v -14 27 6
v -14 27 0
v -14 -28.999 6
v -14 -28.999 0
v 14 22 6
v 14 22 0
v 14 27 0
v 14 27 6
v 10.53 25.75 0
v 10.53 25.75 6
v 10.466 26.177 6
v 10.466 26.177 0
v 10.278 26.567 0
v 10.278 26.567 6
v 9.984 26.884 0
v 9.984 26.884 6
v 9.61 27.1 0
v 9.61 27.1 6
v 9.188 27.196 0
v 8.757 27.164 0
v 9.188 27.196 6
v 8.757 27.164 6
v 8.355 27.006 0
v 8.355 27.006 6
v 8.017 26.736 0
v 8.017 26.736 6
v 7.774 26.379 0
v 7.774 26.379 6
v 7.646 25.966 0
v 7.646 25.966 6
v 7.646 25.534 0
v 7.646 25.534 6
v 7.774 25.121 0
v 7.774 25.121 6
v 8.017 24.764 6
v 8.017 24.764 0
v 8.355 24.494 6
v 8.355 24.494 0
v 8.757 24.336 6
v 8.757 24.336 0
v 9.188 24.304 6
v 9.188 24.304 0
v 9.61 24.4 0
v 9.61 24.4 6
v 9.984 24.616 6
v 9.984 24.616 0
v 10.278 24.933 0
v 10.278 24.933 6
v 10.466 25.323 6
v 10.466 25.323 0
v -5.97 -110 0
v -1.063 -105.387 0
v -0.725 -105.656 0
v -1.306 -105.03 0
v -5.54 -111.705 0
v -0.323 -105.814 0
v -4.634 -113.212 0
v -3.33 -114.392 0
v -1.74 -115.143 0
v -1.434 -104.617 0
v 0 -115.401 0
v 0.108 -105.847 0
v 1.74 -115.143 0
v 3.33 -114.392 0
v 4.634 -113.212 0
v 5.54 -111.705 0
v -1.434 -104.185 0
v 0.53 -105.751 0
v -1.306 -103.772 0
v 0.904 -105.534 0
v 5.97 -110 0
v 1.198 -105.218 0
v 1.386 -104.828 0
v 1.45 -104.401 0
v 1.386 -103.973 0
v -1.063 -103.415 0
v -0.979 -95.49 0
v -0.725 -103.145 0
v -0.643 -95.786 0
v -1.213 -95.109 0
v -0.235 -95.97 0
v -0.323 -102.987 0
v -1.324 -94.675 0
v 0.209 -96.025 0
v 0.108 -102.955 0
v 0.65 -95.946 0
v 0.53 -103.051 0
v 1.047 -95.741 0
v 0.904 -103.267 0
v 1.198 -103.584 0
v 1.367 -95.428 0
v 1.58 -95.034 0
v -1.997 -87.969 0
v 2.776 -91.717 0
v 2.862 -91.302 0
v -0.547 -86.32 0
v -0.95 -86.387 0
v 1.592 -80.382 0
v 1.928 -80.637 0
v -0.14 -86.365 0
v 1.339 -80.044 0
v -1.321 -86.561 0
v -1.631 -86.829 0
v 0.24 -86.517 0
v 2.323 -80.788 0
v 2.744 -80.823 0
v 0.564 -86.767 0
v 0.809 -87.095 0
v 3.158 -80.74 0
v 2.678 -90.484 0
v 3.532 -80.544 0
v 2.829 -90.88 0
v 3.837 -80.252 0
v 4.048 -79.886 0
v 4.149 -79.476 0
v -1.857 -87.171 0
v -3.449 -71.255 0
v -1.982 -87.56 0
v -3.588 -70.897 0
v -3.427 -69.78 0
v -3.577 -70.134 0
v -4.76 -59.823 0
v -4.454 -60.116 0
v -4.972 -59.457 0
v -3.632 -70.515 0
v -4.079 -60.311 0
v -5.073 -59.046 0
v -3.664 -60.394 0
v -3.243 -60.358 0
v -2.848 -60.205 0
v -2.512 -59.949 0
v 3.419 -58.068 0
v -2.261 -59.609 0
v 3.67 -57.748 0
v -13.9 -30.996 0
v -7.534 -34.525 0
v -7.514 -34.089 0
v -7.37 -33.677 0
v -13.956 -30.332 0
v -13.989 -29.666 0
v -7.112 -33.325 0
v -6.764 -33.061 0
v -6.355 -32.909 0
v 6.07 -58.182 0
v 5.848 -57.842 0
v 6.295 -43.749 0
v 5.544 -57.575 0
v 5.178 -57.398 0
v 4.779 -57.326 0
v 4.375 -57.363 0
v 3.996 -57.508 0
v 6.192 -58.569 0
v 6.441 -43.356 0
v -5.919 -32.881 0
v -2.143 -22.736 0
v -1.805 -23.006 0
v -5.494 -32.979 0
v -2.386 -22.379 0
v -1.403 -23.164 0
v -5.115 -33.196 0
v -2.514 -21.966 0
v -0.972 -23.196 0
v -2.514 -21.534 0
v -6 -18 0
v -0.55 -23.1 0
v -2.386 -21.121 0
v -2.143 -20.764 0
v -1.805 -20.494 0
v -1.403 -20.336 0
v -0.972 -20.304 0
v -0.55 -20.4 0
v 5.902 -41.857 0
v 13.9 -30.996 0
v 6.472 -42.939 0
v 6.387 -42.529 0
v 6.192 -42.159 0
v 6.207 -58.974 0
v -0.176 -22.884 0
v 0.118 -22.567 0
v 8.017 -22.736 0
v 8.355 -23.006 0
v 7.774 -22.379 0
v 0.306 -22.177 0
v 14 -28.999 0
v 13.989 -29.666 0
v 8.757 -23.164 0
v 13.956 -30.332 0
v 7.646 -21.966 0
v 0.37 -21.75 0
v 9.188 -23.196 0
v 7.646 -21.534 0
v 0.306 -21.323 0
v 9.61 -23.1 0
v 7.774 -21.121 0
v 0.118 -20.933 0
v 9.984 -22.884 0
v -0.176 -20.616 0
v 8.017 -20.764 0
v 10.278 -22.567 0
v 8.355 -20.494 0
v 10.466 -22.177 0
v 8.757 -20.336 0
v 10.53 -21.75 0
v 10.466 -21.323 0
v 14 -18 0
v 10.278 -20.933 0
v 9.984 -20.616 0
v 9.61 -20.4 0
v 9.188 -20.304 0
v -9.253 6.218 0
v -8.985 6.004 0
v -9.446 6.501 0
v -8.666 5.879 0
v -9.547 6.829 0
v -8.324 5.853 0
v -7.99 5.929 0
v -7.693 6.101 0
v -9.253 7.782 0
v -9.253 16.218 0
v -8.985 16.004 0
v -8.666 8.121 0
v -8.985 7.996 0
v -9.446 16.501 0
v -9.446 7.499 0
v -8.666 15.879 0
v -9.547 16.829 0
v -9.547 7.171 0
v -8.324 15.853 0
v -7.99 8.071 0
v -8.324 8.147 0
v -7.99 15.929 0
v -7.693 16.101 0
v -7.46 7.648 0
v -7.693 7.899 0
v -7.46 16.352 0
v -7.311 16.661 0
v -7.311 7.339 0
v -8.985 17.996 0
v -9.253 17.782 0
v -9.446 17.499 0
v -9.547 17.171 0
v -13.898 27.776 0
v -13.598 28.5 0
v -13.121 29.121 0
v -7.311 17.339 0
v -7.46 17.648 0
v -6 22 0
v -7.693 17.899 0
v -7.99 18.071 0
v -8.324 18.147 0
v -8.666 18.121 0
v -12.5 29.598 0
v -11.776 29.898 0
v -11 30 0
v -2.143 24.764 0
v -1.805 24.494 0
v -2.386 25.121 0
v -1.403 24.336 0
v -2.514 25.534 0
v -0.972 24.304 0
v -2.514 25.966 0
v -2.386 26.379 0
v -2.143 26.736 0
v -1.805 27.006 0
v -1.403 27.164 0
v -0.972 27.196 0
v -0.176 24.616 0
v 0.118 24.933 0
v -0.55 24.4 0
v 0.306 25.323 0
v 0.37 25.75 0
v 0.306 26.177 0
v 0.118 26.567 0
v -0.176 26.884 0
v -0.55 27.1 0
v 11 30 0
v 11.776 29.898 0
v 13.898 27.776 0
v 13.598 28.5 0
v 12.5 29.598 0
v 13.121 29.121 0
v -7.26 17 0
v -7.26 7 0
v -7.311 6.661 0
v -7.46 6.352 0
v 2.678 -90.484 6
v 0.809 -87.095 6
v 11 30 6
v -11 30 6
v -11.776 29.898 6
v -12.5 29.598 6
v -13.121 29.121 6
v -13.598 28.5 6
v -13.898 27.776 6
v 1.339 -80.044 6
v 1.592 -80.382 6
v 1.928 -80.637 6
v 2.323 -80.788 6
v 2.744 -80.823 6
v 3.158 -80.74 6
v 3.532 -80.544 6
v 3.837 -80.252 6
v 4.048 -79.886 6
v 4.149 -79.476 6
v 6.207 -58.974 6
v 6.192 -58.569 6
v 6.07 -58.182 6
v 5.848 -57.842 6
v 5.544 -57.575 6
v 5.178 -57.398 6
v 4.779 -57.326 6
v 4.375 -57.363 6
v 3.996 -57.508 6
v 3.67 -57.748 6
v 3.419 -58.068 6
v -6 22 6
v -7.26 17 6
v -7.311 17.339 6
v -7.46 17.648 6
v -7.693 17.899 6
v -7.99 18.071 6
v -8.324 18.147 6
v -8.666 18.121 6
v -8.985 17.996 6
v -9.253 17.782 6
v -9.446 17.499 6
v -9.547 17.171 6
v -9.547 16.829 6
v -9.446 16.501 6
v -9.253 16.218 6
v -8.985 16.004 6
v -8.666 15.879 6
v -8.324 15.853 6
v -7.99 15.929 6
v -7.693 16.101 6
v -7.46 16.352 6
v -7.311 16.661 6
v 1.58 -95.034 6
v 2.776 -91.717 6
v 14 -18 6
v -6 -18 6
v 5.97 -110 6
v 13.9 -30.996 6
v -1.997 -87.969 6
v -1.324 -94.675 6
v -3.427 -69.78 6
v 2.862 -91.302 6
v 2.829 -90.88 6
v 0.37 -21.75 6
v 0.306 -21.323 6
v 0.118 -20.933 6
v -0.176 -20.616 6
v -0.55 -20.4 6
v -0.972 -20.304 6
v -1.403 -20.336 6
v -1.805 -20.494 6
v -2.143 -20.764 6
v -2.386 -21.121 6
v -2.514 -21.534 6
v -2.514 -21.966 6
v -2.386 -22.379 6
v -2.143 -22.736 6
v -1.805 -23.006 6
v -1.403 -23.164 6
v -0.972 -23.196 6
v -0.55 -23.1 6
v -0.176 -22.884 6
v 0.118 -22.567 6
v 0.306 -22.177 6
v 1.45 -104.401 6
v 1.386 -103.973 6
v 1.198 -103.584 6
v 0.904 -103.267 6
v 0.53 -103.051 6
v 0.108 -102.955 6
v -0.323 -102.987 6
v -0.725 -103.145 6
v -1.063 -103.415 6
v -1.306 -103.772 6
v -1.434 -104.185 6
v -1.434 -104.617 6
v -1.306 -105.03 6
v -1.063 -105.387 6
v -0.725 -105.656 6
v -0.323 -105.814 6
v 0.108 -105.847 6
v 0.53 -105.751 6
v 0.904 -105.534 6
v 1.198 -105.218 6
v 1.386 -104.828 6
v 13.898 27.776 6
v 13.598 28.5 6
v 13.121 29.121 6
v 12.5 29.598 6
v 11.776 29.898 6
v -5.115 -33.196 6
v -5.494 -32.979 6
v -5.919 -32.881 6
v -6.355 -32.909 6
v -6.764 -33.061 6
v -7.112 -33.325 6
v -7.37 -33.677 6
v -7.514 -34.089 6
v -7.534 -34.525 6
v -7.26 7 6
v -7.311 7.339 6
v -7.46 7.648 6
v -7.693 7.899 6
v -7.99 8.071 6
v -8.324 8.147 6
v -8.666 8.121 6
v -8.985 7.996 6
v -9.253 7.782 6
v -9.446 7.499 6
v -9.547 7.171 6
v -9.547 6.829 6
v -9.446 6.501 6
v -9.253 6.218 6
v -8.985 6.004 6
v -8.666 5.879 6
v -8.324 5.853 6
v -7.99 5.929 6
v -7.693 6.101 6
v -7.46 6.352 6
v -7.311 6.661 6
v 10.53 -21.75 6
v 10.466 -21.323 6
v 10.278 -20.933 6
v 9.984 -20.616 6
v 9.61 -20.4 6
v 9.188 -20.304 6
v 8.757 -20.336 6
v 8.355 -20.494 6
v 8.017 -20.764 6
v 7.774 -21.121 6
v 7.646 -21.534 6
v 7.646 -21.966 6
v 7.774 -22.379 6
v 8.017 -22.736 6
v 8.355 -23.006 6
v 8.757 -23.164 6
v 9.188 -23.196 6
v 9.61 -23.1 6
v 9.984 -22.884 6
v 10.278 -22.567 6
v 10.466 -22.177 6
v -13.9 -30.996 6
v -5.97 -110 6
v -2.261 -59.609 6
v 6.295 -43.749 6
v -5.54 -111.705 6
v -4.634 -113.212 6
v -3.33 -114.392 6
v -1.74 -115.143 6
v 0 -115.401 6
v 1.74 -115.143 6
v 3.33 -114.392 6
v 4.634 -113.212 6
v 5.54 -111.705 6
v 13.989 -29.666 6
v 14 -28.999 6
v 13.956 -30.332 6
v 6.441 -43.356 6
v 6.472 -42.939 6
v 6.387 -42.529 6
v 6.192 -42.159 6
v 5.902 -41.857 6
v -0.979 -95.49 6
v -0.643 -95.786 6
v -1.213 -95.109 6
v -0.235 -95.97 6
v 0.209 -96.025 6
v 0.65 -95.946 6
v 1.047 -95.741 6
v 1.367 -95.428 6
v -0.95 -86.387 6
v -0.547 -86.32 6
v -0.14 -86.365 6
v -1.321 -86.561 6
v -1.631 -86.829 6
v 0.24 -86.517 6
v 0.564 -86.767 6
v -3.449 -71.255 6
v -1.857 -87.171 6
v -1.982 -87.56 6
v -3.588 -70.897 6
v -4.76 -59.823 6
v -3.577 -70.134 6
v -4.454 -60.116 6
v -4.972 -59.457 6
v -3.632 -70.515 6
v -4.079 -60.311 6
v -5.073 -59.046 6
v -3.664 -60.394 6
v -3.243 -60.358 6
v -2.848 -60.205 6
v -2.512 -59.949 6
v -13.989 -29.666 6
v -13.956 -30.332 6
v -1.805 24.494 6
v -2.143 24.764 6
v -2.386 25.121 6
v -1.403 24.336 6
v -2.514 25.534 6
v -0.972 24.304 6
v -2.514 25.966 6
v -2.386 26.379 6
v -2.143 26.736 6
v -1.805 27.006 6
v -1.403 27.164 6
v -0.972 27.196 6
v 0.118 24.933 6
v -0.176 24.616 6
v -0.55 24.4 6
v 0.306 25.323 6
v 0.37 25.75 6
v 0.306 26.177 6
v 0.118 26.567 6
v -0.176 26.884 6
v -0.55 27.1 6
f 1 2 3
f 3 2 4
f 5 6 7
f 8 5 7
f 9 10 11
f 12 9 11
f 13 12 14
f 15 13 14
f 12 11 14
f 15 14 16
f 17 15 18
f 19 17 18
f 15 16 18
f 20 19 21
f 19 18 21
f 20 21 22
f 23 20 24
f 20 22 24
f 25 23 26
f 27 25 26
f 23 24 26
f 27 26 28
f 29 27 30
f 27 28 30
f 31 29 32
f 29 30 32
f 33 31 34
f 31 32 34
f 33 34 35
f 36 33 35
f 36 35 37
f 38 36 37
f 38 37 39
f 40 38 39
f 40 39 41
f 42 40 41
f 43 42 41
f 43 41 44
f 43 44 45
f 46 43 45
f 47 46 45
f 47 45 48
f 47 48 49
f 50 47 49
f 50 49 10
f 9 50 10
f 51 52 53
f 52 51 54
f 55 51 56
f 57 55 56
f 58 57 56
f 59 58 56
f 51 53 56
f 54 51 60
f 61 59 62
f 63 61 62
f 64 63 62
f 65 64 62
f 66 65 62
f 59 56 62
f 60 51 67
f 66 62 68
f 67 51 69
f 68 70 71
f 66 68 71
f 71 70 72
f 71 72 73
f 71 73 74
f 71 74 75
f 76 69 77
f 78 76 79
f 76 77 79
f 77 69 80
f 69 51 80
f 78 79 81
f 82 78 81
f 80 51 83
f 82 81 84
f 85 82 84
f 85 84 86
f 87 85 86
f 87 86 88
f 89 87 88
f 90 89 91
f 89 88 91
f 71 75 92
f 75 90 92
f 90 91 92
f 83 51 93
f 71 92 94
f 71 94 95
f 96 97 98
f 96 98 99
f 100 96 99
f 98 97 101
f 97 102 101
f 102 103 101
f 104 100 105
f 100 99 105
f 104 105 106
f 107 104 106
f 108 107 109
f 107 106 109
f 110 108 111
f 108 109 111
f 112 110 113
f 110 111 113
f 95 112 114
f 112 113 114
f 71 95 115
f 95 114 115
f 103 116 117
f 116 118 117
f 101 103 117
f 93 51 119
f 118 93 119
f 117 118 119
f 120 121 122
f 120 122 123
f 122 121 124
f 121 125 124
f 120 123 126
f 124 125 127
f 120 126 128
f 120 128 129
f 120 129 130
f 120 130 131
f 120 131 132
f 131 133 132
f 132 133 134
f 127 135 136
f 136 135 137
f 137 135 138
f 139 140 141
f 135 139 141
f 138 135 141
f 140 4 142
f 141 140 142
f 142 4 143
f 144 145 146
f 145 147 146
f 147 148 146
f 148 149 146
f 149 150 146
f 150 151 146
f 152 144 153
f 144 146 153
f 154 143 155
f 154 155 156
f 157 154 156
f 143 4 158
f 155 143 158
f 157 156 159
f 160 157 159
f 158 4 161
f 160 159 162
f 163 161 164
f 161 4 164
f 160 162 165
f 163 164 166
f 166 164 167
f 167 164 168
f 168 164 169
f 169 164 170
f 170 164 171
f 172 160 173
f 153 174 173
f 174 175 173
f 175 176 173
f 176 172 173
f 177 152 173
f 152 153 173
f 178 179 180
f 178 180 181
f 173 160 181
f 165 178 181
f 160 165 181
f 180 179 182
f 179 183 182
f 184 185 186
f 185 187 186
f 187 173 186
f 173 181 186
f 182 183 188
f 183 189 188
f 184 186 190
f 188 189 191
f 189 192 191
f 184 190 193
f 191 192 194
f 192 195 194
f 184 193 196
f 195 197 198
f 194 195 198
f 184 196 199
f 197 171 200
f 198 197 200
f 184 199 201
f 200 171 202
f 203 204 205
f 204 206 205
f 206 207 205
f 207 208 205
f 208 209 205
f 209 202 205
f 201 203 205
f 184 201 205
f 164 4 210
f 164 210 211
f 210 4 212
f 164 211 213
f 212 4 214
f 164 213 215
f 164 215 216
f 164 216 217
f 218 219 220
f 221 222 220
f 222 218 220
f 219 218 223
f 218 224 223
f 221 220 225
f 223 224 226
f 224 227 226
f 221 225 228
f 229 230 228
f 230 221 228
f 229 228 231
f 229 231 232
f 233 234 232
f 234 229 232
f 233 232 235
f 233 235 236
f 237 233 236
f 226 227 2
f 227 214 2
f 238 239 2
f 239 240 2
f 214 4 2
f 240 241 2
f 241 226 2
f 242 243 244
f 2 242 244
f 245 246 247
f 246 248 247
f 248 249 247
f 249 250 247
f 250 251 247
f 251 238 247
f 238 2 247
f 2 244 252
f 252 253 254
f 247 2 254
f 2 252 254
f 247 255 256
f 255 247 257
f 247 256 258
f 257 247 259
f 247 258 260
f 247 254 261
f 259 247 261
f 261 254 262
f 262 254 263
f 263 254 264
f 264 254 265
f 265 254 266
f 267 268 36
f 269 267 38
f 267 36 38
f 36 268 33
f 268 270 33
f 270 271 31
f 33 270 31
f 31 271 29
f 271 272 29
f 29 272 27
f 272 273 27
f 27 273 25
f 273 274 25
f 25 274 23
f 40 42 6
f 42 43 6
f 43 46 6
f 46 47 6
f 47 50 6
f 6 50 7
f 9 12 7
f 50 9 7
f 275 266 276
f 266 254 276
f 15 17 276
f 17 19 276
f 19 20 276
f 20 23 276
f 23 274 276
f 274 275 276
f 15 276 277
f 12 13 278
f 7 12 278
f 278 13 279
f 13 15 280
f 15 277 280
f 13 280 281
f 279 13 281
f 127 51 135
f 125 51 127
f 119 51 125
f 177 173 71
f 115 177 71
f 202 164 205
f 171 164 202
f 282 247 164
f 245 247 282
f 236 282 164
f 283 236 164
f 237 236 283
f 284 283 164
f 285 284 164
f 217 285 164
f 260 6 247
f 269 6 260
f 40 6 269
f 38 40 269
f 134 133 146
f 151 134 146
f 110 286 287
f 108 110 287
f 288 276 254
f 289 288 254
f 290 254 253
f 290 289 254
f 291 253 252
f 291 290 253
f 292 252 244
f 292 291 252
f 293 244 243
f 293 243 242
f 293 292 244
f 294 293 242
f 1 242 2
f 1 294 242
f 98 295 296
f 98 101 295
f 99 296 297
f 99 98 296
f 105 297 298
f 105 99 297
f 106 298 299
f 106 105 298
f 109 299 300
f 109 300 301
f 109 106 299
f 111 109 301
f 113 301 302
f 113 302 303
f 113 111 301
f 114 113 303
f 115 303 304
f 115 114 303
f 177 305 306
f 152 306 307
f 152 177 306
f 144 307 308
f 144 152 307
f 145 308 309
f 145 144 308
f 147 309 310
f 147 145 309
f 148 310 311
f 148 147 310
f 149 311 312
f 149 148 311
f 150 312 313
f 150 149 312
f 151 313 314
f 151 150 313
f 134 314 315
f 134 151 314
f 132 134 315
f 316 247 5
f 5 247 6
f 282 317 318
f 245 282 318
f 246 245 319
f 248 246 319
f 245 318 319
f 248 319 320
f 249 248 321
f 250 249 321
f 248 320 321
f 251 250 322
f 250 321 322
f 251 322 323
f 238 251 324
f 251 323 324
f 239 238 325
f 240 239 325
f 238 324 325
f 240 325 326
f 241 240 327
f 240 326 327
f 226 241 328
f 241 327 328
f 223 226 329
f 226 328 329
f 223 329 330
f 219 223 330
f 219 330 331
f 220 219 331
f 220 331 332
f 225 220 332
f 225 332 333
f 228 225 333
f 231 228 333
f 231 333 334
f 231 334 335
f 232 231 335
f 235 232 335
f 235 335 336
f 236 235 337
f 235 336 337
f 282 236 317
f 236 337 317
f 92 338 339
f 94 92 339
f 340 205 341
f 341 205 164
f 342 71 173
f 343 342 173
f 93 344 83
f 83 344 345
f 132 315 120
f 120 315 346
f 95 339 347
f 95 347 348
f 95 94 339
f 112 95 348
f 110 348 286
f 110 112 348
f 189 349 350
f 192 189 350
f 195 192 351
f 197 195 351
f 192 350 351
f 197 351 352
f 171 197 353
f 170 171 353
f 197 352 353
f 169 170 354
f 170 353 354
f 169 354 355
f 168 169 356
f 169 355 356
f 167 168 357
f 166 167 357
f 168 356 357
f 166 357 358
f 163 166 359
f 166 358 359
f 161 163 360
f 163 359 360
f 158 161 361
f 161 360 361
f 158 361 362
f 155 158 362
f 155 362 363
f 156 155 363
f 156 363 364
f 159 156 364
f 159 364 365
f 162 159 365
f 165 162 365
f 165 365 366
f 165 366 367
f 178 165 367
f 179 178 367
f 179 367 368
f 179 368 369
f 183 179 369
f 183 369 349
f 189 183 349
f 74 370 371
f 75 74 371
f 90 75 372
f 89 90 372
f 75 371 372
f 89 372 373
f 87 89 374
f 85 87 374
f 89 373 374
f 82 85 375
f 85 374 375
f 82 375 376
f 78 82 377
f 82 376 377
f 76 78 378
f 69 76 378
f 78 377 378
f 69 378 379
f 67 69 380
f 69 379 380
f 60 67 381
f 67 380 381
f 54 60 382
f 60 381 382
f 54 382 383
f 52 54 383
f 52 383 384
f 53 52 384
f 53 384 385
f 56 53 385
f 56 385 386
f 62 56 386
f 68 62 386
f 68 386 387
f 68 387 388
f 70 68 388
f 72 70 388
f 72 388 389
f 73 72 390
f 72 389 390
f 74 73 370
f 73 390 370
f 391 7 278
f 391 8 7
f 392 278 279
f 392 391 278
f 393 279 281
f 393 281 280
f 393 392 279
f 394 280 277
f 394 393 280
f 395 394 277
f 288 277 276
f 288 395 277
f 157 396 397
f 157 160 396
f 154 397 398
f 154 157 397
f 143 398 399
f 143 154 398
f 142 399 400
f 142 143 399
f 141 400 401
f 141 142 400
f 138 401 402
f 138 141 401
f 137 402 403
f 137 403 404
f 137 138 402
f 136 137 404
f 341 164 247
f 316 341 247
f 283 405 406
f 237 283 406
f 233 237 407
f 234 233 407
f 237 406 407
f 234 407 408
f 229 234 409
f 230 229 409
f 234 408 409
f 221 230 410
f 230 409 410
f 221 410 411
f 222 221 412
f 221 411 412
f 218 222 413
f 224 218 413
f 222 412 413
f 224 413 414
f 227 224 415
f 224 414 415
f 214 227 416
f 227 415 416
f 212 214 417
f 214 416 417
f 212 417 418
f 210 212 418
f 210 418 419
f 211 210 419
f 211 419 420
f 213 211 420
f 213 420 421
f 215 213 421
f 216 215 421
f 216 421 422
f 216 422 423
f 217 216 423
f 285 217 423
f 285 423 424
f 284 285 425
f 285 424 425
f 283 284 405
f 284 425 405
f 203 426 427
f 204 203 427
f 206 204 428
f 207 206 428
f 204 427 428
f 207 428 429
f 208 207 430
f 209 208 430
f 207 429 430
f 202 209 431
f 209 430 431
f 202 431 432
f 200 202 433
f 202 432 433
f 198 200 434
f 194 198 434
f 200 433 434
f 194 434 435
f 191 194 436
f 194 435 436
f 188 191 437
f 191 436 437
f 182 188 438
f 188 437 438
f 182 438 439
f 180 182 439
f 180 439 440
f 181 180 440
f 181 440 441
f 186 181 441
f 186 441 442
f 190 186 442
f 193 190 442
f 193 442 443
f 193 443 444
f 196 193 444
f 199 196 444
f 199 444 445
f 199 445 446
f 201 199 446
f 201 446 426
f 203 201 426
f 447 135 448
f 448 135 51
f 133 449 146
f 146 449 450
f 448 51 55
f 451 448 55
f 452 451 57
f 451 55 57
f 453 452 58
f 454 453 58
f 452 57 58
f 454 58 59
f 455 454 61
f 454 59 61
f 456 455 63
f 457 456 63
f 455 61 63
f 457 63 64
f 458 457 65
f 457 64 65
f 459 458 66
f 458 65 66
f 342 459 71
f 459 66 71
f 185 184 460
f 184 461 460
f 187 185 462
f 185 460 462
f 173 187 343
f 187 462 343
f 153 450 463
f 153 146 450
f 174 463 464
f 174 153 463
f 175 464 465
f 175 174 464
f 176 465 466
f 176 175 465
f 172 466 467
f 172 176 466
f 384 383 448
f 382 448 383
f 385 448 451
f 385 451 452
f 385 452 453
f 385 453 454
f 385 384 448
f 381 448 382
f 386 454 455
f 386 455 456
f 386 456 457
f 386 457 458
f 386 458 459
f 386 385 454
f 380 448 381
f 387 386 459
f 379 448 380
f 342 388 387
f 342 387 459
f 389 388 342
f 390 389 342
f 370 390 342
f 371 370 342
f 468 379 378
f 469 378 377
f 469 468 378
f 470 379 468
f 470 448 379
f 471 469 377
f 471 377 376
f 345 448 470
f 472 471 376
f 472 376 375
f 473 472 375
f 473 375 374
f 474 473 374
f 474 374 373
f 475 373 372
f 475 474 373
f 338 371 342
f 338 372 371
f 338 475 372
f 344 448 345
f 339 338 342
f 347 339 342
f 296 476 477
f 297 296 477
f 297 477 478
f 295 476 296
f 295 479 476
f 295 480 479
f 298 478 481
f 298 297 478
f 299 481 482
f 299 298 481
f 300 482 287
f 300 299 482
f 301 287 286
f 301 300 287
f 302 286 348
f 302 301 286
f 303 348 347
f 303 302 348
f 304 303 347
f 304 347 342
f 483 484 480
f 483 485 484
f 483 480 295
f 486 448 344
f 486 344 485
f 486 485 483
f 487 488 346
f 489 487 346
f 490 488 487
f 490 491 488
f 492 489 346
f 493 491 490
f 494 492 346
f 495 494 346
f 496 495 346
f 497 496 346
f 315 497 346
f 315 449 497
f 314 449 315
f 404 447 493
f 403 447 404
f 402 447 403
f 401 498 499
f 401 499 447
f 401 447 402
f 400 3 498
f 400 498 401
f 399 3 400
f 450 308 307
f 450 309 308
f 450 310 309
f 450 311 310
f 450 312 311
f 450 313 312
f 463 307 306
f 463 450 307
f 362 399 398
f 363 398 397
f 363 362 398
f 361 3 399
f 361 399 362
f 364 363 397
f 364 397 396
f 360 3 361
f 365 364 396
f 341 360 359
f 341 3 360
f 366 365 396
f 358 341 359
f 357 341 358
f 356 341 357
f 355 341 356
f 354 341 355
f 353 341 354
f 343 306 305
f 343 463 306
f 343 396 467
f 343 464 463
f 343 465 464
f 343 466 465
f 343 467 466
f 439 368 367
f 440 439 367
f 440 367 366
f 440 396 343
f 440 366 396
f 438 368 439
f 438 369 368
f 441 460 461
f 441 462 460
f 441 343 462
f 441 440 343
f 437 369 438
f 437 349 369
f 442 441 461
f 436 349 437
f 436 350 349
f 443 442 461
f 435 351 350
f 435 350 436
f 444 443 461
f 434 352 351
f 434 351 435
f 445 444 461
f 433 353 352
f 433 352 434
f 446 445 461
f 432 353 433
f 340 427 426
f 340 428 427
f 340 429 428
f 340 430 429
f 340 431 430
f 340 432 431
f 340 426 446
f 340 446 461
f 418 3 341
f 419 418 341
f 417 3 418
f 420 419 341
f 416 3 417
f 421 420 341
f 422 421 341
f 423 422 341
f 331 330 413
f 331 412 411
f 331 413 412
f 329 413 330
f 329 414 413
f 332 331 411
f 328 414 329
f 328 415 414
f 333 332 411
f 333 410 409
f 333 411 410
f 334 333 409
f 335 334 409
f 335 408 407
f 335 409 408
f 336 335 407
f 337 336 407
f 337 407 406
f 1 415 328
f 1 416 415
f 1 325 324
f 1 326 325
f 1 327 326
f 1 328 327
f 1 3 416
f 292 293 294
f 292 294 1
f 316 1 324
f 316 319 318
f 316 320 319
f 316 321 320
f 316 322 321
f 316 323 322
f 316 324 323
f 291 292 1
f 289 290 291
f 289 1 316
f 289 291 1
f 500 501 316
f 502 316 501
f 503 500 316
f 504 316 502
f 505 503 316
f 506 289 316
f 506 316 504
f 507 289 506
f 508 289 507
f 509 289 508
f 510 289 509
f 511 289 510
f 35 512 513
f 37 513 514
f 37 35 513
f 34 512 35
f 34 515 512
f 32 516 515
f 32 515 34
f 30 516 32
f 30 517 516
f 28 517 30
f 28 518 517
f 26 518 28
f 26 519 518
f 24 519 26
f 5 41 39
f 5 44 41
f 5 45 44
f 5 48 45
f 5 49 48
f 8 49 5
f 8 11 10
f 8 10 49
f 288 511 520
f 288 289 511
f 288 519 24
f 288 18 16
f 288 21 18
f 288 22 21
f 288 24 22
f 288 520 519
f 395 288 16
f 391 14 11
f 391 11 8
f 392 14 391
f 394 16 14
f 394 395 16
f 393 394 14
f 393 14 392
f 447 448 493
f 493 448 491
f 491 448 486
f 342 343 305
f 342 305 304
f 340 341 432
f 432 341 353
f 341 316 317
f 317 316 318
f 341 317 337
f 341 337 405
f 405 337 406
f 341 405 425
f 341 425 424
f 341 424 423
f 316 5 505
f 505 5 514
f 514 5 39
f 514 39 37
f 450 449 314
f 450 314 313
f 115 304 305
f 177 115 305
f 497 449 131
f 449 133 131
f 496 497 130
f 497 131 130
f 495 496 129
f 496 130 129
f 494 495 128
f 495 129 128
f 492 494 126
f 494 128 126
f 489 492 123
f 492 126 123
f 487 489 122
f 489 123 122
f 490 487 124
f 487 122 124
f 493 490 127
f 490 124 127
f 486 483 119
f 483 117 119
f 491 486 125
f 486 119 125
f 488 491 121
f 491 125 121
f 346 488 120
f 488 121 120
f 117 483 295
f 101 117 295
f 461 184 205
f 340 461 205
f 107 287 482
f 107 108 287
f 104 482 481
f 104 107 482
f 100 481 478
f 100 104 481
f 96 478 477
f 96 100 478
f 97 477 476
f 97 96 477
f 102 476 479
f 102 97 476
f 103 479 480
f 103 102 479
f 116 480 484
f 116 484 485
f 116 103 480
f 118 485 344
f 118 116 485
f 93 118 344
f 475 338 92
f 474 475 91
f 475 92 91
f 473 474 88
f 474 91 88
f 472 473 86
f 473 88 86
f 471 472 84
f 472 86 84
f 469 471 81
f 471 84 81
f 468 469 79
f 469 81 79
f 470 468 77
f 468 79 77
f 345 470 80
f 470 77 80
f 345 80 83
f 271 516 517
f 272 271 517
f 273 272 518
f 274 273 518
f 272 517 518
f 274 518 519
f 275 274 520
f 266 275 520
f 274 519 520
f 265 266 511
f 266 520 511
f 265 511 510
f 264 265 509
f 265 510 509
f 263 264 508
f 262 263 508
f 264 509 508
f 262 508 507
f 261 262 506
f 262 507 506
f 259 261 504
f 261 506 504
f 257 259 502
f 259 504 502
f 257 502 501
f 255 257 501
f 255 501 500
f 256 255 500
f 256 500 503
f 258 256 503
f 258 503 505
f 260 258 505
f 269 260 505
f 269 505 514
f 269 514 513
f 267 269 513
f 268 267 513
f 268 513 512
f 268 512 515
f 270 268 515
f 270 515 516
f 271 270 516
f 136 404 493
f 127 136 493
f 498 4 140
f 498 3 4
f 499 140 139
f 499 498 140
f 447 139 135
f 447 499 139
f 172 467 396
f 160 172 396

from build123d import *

# Parameters (mm, degrees)
BOSS_EXTRU_1_DEPTH      = 6
CONG_1_R                = 3
CONG_2_R                = 20
ENL_V_MAT_EXTRU_1_REACH = 118.402
ESQUISSE2_R             = 1.45
ENL_V_MAT_EXTRU_2_REACH = 118.402
CONG_3_R                = 1.5
ESQUISSE4_R             = 1.45
ENL_V_MAT_EXTRU_3_DEPTH = 6
ESQUISSE5_R             = 1.15
ENL_V_MAT_EXTRU_4_DEPTH = 6


with BuildPart() as part:
    # Esquisse1 → Boss.-Extru.1 (new body)
    with BuildSketch(Plane.XY):
        with BuildLine():
            Line((-14, -30), (-5.970001079, -110))
            ThreePointArc((-5.970001079, -110), (0, -115.400761222), (5.970001079, -110))
            Line((5.970001079, -110), (14, -30))
            Line((14, -30), (14, -18))
            Line((14, -18), (-6, -18))
            Line((-6, -18), (-6, 22))
            Line((-6, 22), (14, 22))
            Line((14, 22), (14, 30))
            Line((14, 30), (-14, 30))
            Line((-14, 30), (-14, -30))
        make_face()
    extrude(amount=BOSS_EXTRU_1_DEPTH)

    # Congé1
    cong_1_edges = [part.edges().sort_by_distance(p)[0] for p in [
        (-14, 30, 3),
        (14, 30, 3),
    ]]
    fillet(cong_1_edges, radius=CONG_1_R)

    # Congé2
    cong_2_edges = [part.edges().sort_by_distance(p)[0] for p in [
        (14, -30, 3),
        (-14, -30, 3),
    ]]
    fillet(cong_2_edges, radius=CONG_2_R)

    # Esquisse2 → Enlèv. mat.-Extru.1 (cut, up to next)
    with BuildSketch(Plane.XY.offset(6), mode=Mode.PRIVATE) as enl_v_mat_extru_1_sk1:
        with Locations((9.08, -21.75)):
            Circle(ESQUISSE2_R)
    enl_v_mat_extru_1_tool1 = extrude(enl_v_mat_extru_1_sk1.sketch, amount=-ENL_V_MAT_EXTRU_1_REACH, mode=Mode.PRIVATE) & part.part
    # Esquisse2 → Enlèv. mat.-Extru.1 (cut, up to next)
    with BuildSketch(Plane.XY.offset(6), mode=Mode.PRIVATE) as enl_v_mat_extru_1_sk2:
        with Locations((-1.08, -21.75)):
            Circle(ESQUISSE2_R)
    enl_v_mat_extru_1_tool2 = extrude(enl_v_mat_extru_1_sk2.sketch, amount=-ENL_V_MAT_EXTRU_1_REACH, mode=Mode.PRIVATE) & part.part
    # Esquisse2 → Enlèv. mat.-Extru.1 (cut, up to next)
    with BuildSketch(Plane.XY.offset(6), mode=Mode.PRIVATE) as enl_v_mat_extru_1_sk3:
        with Locations((-1.08, 25.75)):
            Circle(ESQUISSE2_R)
    enl_v_mat_extru_1_tool3 = extrude(enl_v_mat_extru_1_sk3.sketch, amount=-ENL_V_MAT_EXTRU_1_REACH, mode=Mode.PRIVATE) & part.part
    # Esquisse2 → Enlèv. mat.-Extru.1 (cut, up to next)
    with BuildSketch(Plane.XY.offset(6), mode=Mode.PRIVATE) as enl_v_mat_extru_1_sk4:
        with Locations((9.08, 25.75)):
            Circle(ESQUISSE2_R)
    enl_v_mat_extru_1_tool4 = extrude(enl_v_mat_extru_1_sk4.sketch, amount=-ENL_V_MAT_EXTRU_1_REACH, mode=Mode.PRIVATE) & part.part
    add(enl_v_mat_extru_1_tool1.solids().sort_by_distance((9.08, -21.75, 6))[0], mode=Mode.SUBTRACT)
    add(enl_v_mat_extru_1_tool2.solids().sort_by_distance((-1.08, -21.75, 6))[0], mode=Mode.SUBTRACT)
    add(enl_v_mat_extru_1_tool3.solids().sort_by_distance((-1.08, 25.75, 6))[0], mode=Mode.SUBTRACT)
    add(enl_v_mat_extru_1_tool4.solids().sort_by_distance((9.08, 25.75, 6))[0], mode=Mode.SUBTRACT)

    # Esquisse3 → Enlèv. mat.-Extru.2 (cut, up to next)
    with BuildSketch(Plane.XY.offset(6), mode=Mode.PRIVATE) as enl_v_mat_extru_2_sk1:
        Polygon((-7.886583597, -31.017533633), (-4.584381628, -63.916187805), (6.894740823, -42.63737417), align=None)
    enl_v_mat_extru_2_tool1 = extrude(enl_v_mat_extru_2_sk1.sketch, amount=-ENL_V_MAT_EXTRU_2_REACH, mode=Mode.PRIVATE) & part.part
    # Esquisse3 → Enlèv. mat.-Extru.2 (cut, up to next)
    with BuildSketch(Plane.XY.offset(6), mode=Mode.PRIVATE) as enl_v_mat_extru_2_sk2:
        Polygon((6.894740823, -52.121802831), (-3.854189345, -70.511493223), (3.66385974, -84.30991259), align=None)
    enl_v_mat_extru_2_tool2 = extrude(enl_v_mat_extru_2_sk2.sketch, amount=-ENL_V_MAT_EXTRU_2_REACH, mode=Mode.PRIVATE) & part.part
    # Esquisse3 → Enlèv. mat.-Extru.2 (cut, up to next)
    with BuildSketch(Plane.XY.offset(6), mode=Mode.PRIVATE) as enl_v_mat_extru_2_sk3:
        Polygon((-2.728137467, -80.682315655), (-0.663223344, -101.254314661), (3.006387716, -91.078168987), align=None)
    enl_v_mat_extru_2_tool3 = extrude(enl_v_mat_extru_2_sk3.sketch, amount=-ENL_V_MAT_EXTRU_2_REACH, mode=Mode.PRIVATE) & part.part
    add(enl_v_mat_extru_2_tool1.solids().sort_by_distance((-1.858741, -45.857032, 6))[0], mode=Mode.SUBTRACT)
    add(enl_v_mat_extru_2_tool2.solids().sort_by_distance((2.234804, -68.98107, 6))[0], mode=Mode.SUBTRACT)
    add(enl_v_mat_extru_2_tool3.solids().sort_by_distance((-0.128324, -91.004933, 6))[0], mode=Mode.SUBTRACT)

    # Congé3
    cong_3_edges = [part.edges().sort_by_distance(p)[0] for p in [
        (6.894740823, -52.121802831, 3),
        (3.66385974, -84.30991259, 3),
        (-3.854189345, -70.511493223, 3),
        (-2.728137467, -80.682315655, 3),
        (3.006387716, -91.078168987, 3),
        (-0.663223344, -101.254314661, 3),
        (-7.886583597, -31.017533633, 3),
        (6.894740823, -42.63737417, 3),
        (-4.584381628, -63.916187805, 3),
    ]]
    fillet(cong_3_edges, radius=CONG_3_R)

    # Esquisse4 → Enlèv. mat.-Extru.3 (cut)
    with BuildSketch(Plane.XY.offset(6)):
        with Locations((0, -104.400761222)):
            Circle(ESQUISSE4_R)
    extrude(amount=-ENL_V_MAT_EXTRU_3_DEPTH, mode=Mode.SUBTRACT)

    # Esquisse5 → Enlèv. mat.-Extru.4 (cut)
    with BuildSketch(Plane.XY.offset(6)):
        with Locations((-8.41, 17)):
            Circle(ESQUISSE5_R)
        with Locations((-8.41, 7)):
            Circle(ESQUISSE5_R)
    extrude(amount=-ENL_V_MAT_EXTRU_4_DEPTH, mode=Mode.SUBTRACT)


solid = part.part
